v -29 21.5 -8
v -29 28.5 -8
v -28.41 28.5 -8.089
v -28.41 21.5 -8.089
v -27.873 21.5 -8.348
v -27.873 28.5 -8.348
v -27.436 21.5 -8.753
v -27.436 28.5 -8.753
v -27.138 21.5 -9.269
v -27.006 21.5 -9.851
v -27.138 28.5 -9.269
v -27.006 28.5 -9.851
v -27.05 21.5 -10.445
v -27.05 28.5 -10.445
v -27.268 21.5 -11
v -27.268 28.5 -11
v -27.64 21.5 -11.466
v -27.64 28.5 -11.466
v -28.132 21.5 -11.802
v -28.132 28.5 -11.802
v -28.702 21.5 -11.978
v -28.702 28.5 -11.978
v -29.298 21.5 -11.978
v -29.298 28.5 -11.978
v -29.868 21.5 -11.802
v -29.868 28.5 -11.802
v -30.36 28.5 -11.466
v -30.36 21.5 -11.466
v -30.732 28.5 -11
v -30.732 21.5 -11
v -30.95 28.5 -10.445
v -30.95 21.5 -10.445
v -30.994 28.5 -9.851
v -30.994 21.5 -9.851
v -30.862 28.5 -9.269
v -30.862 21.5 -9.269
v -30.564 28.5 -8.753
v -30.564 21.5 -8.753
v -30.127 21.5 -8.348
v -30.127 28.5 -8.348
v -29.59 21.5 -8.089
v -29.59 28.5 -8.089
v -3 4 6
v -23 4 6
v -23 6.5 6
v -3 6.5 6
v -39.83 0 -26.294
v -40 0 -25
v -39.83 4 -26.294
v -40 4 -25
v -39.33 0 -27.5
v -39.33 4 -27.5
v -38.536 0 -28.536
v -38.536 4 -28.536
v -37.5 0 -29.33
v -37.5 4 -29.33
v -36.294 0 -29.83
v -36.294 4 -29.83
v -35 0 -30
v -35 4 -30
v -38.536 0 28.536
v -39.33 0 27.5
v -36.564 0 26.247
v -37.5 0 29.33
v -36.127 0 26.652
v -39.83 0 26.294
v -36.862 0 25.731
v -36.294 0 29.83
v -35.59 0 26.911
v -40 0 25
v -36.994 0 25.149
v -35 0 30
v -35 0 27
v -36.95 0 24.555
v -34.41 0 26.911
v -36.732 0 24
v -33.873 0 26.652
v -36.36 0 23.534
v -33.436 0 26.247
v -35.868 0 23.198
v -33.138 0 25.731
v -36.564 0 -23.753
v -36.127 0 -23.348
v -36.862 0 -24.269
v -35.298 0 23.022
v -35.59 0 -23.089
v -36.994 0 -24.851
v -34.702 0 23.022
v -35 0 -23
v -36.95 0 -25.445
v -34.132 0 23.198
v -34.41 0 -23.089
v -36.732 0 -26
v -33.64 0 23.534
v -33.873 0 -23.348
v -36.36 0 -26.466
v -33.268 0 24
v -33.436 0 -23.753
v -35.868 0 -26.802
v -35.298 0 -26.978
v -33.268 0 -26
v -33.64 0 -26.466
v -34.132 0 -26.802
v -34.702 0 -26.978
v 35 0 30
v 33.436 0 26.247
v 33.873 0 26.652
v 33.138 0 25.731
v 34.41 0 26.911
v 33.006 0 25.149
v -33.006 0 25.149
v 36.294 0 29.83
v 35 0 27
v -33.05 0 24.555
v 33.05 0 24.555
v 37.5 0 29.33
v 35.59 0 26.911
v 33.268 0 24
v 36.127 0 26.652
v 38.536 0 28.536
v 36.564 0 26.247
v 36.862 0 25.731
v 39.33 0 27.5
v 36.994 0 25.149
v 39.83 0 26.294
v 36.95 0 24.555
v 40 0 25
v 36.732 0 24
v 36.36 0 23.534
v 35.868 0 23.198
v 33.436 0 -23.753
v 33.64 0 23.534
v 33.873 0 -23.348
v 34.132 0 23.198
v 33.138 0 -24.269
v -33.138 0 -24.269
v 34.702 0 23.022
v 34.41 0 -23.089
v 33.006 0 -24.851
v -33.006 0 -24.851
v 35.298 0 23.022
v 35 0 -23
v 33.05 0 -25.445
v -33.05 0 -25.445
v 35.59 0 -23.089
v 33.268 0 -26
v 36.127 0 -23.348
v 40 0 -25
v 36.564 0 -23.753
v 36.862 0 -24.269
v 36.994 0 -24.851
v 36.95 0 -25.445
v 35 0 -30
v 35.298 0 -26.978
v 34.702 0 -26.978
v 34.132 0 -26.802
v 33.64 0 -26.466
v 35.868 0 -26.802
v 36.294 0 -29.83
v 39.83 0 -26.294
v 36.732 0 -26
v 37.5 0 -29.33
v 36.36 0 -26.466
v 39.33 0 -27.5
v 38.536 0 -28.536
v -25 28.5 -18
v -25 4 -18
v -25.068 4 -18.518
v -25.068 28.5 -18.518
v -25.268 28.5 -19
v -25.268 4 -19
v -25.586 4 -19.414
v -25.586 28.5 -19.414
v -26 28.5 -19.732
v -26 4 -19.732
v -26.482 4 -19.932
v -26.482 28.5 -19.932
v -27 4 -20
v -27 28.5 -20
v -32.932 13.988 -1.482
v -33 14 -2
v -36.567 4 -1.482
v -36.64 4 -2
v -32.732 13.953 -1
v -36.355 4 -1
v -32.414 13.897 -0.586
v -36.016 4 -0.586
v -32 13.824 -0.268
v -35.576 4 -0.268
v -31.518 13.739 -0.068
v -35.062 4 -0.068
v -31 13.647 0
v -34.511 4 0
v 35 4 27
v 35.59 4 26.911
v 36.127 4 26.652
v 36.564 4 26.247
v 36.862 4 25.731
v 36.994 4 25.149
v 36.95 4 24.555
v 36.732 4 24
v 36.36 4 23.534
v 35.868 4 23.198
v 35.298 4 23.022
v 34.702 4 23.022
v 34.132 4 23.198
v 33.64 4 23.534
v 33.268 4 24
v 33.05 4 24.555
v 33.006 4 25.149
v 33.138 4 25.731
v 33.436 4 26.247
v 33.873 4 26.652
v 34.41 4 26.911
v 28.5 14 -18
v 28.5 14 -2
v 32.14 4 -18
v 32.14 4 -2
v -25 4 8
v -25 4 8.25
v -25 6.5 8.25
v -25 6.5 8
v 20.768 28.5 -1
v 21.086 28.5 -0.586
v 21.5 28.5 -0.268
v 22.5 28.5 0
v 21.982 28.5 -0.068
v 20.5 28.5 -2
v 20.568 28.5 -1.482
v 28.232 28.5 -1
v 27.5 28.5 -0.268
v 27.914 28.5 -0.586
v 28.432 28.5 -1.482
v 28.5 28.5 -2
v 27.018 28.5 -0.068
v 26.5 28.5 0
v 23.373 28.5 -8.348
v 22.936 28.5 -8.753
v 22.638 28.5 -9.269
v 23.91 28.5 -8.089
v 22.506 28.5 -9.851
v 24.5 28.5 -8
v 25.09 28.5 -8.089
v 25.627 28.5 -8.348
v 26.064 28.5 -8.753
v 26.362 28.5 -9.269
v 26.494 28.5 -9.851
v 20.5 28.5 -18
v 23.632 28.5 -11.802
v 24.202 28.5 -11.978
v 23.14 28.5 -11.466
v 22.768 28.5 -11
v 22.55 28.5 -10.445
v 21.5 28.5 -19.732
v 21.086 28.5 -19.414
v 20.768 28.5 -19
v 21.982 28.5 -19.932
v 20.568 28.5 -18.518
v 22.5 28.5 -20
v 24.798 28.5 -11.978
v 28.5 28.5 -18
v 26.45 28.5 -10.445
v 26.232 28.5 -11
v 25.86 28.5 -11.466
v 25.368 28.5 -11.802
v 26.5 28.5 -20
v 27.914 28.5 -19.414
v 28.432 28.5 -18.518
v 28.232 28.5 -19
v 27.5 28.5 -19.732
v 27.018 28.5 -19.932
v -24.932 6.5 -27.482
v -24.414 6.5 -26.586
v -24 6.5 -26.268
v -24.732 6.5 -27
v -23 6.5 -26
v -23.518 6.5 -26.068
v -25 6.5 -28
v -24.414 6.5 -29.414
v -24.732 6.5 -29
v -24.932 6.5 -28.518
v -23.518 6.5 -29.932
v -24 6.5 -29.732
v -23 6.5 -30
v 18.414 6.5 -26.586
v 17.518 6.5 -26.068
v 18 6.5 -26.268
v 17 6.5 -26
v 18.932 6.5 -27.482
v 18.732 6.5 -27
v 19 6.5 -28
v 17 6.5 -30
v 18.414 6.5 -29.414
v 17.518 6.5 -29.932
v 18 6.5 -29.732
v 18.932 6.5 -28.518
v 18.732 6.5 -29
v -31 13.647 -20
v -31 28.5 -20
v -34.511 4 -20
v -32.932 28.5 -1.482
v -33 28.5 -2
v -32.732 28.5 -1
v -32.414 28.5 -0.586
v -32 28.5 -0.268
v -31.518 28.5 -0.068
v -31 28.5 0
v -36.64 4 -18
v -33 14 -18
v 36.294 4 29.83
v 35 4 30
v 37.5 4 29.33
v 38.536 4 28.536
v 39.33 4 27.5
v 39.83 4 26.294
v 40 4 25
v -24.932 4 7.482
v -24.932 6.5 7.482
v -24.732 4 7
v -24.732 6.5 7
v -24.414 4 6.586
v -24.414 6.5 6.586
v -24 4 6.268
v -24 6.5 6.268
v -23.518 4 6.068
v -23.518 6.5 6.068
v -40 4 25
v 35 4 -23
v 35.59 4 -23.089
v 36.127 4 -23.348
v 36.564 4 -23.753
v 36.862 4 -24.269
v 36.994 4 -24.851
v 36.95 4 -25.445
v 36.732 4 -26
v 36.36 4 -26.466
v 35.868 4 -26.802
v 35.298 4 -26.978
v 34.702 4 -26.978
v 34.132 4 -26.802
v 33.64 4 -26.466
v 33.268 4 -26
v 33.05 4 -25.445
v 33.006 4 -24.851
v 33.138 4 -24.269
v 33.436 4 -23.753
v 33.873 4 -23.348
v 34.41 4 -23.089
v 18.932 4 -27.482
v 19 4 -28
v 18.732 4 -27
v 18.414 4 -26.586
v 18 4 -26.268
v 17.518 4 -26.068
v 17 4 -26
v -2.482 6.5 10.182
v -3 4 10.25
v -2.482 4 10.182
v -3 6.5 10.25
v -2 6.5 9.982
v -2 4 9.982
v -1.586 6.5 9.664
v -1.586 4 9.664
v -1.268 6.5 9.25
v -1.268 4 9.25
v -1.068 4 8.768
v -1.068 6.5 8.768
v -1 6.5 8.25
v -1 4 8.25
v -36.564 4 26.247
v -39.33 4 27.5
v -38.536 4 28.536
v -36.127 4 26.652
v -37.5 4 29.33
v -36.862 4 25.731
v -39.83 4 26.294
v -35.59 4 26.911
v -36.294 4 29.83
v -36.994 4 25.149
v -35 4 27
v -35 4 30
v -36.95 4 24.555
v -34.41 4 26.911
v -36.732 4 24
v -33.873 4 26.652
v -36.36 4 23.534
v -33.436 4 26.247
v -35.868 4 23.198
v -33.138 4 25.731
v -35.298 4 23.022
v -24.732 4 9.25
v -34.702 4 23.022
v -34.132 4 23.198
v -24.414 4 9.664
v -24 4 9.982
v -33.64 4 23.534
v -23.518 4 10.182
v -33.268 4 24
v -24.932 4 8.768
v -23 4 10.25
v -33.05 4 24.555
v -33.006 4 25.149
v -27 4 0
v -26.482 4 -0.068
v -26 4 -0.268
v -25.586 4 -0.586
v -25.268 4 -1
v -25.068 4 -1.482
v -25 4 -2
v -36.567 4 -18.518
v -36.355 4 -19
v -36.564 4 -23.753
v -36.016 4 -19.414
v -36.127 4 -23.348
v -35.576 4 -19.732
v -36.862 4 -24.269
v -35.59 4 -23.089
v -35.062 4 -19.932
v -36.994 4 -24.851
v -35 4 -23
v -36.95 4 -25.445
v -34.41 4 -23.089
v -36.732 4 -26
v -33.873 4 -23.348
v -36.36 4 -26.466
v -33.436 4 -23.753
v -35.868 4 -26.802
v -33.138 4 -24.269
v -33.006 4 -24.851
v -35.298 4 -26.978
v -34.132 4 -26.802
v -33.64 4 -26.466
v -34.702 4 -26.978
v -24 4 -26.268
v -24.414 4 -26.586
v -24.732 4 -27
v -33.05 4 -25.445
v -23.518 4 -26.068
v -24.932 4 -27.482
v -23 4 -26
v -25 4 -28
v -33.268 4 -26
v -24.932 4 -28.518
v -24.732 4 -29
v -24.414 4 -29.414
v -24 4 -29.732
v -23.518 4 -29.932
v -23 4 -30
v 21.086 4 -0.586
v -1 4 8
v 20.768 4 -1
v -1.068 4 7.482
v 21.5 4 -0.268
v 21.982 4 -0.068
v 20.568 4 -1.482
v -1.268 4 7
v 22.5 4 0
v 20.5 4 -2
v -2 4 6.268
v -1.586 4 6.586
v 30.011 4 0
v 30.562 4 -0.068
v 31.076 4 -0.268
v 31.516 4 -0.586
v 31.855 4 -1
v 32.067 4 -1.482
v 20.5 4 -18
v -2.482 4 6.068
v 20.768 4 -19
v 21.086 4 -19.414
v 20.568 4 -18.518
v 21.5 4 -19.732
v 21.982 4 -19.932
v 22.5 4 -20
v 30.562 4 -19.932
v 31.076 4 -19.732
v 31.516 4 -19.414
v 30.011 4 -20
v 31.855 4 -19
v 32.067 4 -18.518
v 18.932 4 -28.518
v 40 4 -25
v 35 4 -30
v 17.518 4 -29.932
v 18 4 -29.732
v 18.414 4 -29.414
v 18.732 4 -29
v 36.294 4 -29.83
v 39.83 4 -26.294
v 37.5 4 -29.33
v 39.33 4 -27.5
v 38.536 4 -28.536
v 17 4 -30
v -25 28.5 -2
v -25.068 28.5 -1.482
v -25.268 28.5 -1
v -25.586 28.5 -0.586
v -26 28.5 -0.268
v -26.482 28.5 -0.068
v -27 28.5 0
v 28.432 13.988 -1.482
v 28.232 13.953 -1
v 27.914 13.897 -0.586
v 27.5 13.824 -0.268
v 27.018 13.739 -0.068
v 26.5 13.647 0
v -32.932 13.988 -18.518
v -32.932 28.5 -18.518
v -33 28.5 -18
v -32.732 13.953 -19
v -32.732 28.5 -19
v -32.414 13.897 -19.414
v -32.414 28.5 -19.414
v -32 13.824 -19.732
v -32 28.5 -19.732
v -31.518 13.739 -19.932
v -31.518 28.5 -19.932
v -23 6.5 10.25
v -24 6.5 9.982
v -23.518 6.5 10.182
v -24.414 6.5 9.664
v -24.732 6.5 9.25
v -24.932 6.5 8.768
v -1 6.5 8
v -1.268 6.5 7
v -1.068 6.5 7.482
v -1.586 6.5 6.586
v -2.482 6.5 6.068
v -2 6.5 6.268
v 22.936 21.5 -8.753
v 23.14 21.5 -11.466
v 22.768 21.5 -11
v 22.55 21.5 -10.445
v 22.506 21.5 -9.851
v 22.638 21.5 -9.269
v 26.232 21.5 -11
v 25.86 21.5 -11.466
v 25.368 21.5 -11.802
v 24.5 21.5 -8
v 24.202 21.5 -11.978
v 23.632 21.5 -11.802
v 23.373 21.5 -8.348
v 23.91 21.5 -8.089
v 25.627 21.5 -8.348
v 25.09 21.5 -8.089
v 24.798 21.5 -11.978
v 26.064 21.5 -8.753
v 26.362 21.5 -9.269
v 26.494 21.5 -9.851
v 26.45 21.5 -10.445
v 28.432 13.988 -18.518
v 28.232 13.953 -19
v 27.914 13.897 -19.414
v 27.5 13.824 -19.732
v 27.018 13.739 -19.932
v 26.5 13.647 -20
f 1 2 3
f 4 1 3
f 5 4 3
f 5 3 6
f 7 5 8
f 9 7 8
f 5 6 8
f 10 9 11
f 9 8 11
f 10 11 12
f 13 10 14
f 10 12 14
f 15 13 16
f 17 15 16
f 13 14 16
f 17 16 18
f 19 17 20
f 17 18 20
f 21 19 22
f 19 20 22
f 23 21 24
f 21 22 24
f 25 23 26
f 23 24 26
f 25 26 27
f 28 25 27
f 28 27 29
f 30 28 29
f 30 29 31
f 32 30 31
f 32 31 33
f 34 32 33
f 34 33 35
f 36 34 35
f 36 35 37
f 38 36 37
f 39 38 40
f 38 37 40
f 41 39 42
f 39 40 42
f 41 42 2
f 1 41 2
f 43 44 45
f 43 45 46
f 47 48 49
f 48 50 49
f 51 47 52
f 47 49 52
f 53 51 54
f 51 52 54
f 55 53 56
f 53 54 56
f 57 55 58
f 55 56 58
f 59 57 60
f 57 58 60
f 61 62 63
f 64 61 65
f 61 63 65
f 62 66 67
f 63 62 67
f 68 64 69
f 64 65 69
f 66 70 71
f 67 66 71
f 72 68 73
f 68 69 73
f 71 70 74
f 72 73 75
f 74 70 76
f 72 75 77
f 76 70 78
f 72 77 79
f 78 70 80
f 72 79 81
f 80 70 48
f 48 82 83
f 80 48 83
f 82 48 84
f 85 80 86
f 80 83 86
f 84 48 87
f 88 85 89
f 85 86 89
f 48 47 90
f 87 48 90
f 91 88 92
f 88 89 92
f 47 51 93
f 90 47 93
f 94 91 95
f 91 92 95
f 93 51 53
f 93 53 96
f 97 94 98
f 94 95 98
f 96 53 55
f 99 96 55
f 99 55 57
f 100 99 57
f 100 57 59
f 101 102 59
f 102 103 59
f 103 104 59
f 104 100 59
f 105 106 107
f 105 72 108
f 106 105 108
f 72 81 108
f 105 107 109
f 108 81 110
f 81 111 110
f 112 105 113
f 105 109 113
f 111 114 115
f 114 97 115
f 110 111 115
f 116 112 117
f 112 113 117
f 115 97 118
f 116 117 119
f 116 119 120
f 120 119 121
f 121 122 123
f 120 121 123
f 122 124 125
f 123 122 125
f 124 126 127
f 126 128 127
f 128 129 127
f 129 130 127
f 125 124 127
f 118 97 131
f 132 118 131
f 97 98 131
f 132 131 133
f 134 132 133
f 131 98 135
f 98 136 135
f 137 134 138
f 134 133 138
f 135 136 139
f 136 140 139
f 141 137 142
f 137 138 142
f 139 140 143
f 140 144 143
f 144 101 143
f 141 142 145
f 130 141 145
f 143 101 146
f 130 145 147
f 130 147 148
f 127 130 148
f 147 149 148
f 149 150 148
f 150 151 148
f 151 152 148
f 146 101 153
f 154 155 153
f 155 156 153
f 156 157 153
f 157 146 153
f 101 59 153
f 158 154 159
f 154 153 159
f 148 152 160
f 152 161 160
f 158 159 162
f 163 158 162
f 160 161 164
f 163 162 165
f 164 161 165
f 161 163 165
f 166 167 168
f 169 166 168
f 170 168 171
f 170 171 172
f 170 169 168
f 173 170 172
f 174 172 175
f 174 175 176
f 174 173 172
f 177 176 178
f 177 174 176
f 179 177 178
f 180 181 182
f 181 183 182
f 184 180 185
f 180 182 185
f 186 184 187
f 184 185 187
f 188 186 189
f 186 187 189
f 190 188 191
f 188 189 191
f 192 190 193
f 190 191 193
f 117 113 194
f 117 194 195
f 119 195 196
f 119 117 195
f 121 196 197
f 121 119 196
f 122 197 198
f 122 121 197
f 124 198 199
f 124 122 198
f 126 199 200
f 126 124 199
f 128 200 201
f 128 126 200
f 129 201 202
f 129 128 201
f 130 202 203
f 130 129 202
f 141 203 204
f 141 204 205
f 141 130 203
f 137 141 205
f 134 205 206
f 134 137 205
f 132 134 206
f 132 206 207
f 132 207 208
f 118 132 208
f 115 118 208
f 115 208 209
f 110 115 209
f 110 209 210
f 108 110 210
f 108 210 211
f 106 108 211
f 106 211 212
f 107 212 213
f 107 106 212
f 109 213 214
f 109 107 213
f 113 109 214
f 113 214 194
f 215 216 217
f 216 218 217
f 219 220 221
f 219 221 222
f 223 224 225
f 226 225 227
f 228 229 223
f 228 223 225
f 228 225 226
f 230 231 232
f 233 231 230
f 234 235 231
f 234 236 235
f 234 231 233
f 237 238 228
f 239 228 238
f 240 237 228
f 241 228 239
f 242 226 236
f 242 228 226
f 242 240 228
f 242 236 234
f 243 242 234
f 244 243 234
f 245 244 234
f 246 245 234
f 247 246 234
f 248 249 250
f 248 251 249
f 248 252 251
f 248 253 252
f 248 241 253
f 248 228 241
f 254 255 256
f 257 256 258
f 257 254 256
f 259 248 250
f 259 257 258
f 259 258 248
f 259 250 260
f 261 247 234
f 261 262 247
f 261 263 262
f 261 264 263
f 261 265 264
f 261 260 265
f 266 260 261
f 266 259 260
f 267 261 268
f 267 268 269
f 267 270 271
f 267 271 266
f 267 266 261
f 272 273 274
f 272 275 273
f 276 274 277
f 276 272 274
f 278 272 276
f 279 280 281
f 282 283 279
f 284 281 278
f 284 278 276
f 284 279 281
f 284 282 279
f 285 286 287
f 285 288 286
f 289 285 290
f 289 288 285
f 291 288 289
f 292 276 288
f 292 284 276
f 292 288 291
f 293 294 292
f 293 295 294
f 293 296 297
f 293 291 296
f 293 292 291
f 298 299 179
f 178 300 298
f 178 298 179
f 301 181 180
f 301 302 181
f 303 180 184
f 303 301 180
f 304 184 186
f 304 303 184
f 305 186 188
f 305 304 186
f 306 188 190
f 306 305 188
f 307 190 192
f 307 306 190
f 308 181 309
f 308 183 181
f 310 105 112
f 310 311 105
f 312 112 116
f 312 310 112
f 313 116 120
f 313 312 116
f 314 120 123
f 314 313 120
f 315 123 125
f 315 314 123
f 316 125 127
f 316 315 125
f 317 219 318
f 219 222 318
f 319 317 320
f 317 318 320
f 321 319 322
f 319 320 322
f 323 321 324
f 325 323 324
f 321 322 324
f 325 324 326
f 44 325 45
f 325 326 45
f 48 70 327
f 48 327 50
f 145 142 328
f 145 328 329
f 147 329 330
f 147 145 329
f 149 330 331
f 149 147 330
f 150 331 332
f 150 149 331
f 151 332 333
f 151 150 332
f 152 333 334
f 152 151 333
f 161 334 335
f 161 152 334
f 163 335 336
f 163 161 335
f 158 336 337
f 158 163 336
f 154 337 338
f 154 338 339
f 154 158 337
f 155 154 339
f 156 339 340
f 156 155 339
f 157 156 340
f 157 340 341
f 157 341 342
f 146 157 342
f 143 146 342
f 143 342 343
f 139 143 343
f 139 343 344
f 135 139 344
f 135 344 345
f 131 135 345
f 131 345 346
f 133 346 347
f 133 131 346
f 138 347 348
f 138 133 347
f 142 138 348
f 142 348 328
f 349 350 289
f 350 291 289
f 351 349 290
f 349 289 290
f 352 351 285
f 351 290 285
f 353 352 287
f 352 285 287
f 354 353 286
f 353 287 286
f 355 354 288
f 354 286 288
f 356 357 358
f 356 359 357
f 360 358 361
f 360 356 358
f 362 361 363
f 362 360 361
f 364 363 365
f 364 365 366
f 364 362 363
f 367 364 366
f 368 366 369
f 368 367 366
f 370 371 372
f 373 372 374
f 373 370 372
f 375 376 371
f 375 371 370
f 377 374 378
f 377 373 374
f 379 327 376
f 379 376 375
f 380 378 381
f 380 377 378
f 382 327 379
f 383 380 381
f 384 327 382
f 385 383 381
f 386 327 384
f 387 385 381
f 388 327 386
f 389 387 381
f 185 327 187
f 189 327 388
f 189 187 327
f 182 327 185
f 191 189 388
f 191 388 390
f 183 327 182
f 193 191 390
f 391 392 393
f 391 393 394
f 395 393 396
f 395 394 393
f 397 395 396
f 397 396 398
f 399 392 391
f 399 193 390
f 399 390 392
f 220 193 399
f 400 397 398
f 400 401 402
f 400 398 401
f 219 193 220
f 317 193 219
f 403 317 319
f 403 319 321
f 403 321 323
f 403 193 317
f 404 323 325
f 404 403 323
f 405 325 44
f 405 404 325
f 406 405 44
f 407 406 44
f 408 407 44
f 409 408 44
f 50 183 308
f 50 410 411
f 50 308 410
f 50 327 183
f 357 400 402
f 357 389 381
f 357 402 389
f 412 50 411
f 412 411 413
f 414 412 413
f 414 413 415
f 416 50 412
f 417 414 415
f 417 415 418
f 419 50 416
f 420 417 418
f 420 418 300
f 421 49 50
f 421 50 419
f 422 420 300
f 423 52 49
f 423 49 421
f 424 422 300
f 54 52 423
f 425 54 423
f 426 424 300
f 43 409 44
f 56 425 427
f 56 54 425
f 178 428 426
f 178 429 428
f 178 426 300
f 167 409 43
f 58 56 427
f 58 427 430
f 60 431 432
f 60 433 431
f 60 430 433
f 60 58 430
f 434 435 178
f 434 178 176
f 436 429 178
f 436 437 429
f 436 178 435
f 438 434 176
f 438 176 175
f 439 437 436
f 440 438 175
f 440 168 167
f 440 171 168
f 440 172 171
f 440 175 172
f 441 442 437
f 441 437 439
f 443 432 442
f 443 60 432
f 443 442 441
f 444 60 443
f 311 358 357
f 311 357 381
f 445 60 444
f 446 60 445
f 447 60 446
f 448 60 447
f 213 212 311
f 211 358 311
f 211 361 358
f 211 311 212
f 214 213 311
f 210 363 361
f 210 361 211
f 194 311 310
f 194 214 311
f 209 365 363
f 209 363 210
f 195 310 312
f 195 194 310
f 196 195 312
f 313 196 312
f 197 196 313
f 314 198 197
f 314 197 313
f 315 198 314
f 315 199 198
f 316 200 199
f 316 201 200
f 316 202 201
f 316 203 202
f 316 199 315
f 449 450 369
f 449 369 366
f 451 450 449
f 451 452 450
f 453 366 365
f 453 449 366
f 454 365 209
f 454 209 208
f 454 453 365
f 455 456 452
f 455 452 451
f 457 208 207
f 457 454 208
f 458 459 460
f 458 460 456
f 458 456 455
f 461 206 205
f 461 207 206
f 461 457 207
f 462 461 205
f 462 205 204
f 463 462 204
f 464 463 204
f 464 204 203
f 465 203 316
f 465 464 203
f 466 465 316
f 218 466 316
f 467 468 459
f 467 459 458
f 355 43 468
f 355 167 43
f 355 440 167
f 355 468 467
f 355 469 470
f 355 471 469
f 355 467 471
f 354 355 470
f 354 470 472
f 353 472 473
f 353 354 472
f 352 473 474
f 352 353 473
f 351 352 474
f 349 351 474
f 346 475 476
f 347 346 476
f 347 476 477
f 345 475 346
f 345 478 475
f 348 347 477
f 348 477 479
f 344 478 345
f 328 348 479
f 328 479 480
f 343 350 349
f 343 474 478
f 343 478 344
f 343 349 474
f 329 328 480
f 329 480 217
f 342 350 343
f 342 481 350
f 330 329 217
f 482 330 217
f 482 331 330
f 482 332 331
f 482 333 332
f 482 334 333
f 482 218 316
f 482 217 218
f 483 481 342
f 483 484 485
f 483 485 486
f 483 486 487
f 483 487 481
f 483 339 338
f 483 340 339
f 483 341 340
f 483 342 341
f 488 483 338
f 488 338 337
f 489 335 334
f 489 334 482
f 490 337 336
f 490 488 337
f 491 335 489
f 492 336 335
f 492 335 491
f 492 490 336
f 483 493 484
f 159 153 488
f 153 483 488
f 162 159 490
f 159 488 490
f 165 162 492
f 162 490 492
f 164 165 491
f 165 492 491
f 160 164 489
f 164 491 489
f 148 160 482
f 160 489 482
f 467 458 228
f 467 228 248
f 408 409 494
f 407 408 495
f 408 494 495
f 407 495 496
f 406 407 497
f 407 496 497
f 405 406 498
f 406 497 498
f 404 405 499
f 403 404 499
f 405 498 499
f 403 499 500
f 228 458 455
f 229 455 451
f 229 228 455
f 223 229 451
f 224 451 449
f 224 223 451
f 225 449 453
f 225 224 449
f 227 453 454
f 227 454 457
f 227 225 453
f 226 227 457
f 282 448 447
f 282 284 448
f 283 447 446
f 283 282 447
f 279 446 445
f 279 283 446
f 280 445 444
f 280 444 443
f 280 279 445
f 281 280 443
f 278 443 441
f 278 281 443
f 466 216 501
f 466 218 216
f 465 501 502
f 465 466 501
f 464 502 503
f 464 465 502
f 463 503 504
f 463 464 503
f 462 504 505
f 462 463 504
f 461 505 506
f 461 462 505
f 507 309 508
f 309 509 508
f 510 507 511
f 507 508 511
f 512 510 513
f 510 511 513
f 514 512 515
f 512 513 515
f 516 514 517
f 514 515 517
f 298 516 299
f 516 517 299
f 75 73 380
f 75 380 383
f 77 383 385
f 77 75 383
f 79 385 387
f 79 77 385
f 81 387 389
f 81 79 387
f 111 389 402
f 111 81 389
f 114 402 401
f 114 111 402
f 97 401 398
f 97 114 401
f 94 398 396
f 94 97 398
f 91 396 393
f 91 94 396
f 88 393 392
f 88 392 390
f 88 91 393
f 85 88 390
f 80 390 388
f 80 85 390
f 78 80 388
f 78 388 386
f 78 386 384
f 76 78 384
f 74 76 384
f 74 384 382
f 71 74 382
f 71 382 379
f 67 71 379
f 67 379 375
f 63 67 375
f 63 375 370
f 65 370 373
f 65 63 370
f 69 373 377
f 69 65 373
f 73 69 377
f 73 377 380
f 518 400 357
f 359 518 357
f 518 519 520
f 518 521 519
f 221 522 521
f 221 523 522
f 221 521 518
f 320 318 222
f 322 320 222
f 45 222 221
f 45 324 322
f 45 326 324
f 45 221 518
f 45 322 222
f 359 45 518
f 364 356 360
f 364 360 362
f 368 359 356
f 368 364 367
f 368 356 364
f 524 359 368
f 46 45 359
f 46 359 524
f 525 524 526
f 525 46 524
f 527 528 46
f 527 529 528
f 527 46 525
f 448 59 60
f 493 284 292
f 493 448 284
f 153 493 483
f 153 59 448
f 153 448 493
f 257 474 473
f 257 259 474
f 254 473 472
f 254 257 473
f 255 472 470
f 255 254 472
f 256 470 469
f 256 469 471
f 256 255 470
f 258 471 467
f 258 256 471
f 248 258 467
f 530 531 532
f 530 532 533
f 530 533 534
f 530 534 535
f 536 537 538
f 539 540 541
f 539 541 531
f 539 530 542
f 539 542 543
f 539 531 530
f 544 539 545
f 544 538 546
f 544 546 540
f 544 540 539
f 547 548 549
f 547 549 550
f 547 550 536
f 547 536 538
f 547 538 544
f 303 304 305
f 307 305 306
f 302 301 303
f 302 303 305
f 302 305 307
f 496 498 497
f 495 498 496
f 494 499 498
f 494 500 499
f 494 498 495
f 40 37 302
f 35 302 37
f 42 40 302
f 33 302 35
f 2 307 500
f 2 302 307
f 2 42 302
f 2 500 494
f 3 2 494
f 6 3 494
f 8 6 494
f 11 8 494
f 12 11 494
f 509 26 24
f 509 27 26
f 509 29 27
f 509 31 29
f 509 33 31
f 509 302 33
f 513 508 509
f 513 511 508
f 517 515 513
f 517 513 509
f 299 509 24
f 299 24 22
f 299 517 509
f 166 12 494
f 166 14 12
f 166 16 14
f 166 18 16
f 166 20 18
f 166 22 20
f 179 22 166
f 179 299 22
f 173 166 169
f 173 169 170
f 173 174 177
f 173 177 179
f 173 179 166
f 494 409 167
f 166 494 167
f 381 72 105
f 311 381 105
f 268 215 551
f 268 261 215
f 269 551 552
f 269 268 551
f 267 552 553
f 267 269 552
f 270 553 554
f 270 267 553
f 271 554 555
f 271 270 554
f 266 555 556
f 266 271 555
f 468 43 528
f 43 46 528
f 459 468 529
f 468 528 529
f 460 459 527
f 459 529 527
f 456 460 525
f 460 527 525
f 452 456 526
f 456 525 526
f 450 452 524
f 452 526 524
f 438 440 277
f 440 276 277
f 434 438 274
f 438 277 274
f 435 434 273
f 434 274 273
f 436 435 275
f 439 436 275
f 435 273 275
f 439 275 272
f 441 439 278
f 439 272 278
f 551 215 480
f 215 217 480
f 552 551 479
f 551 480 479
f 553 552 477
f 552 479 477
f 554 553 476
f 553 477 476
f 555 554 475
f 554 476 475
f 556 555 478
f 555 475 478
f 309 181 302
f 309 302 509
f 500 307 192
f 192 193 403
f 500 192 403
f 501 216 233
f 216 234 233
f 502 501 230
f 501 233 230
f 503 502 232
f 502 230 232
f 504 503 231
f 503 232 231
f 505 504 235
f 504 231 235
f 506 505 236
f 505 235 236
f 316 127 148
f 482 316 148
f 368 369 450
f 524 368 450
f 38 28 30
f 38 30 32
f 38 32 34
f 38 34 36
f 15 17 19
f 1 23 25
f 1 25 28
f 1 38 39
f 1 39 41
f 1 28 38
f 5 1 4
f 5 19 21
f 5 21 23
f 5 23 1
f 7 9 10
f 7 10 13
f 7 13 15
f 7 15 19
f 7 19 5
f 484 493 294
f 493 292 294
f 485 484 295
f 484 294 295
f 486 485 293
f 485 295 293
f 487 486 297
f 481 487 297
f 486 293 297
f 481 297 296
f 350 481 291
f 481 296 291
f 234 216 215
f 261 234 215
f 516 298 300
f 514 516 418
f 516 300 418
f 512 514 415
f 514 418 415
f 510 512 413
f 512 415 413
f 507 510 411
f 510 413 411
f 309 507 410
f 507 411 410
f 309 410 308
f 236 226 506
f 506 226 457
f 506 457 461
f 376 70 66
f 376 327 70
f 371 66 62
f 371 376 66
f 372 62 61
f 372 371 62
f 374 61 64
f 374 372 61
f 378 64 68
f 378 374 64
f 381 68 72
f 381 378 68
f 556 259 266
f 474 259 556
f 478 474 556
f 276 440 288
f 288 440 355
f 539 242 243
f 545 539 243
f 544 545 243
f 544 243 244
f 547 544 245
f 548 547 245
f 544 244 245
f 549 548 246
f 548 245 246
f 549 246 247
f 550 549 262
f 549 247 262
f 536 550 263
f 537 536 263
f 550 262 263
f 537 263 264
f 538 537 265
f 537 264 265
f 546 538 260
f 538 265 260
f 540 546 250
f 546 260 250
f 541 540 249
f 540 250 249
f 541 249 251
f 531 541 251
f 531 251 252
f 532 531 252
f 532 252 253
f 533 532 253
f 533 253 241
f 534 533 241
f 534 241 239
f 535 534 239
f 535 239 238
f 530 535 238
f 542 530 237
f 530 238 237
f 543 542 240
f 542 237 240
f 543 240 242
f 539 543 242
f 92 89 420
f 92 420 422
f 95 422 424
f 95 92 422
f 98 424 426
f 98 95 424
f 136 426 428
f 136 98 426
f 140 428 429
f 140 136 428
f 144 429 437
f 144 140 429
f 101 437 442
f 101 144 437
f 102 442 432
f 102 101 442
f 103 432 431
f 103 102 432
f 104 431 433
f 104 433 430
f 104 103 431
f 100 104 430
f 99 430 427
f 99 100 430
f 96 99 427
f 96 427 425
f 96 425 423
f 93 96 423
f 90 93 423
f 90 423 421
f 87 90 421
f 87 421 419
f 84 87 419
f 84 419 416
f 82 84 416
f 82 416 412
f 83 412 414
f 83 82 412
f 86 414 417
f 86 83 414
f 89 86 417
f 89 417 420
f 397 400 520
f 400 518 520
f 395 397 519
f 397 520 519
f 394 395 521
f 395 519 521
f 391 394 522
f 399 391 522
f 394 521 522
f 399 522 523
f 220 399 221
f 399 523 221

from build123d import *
from OCP.BRepFilletAPI import BRepFilletAPI_MakeChamfer

# Parameters (mm, degrees)
SKETCH_1_W          = 80
SKETCH_1_H          = 60
SKETCH_1_R          = 2
EXTRUDE_1_DEPTH     = 4
FILLET_1_R          = 5
SKETCH_2_W          = 44
SKETCH_2_H          = 4
SKETCH_2_W_2        = 24
SKETCH_2_H_2        = 4.25
EXTRUDE_2_DEPTH     = 2.5
SKETCH_2_3_W        = 8
SKETCH_2_3_H        = 20
EXTRUDE_3_DEPTH     = 24.5
SKETCH_3_R          = 2
CUT_EXTRUDE_1_DEPTH = 7
CHAMFER_1_SIZE      = 10
CHAMFER_1_SIZE2     = 3.639702343
FILLET_2_R          = 2
FILLET_3_R          = 2


with BuildPart() as part:
    # Эскиз1 → Бобышка-Вытянуть1 (new body)
    with BuildSketch(Plane(origin=(0, 0, 0), x_dir=(1, 0, 0), z_dir=(0, 1, 0))):
        Rectangle(SKETCH_1_W, SKETCH_1_H)
        with Locations(Location((-35, 25, 0), (0, 0, 270))):
            Circle(SKETCH_1_R, mode=Mode.SUBTRACT)
        with Locations(Location((35, 25, 0), (0, 0, 270))):
            Circle(SKETCH_1_R, mode=Mode.SUBTRACT)
        with Locations(Location((-35, -25, 0), (0, 0, 270))):
            Circle(SKETCH_1_R, mode=Mode.SUBTRACT)
        with Locations(Location((35, -25, 0), (0, 0, 270))):
            Circle(SKETCH_1_R, mode=Mode.SUBTRACT)
    extrude(amount=EXTRUDE_1_DEPTH)

    # Скругление1
    fillet_1_edges = [part.edges().sort_by_distance(p)[0] for p in [
        (40, 2, 30),
        (-40, 2, 30),
        (-40, 2, -30),
        (40, 2, -30),
    ]]
    fillet(fillet_1_edges, radius=FILLET_1_R)

    # Эскиз2 → Бобышка-Вытянуть2 (add)
    with BuildSketch(Plane(origin=(0, 4, 0), x_dir=(1, 0, 0), z_dir=(0, 1, 0))):
        with Locations((-3, 28)):
            Rectangle(SKETCH_2_W, SKETCH_2_H)
        with Locations((-13, -8.125)):
            Rectangle(SKETCH_2_W_2, SKETCH_2_H_2)
    extrude(amount=EXTRUDE_2_DEPTH)

    # Эскиз2<3> → Бобышка-Вытянуть3 (add)
    with BuildSketch(Plane(origin=(0, 4, 0), x_dir=(1, 0, 0), z_dir=(0, 1, 0))):
        with Locations((24.5, 10)):
            Rectangle(SKETCH_2_3_W, SKETCH_2_3_H)
        with Locations((-29, 10)):
            Rectangle(SKETCH_2_3_W, SKETCH_2_3_H)
    extrude(amount=EXTRUDE_3_DEPTH)

    # Эскиз3 → Вырез-Вытянуть1 (cut)
    with BuildSketch(Plane(origin=(0, 28.5, 0), x_dir=(1, 0, 0), z_dir=(0, 1, 0))):
        with Locations(Location((-29, 10, 0), (0, 0, 270))):
            Circle(SKETCH_3_R)
        with Locations(Location((24.5, 10, 0), (0, 0, 270))):
            Circle(SKETCH_3_R)
    extrude(amount=-CUT_EXTRUDE_1_DEPTH, mode=Mode.SUBTRACT)

    # Фаска1: one chamfer whose edges measure the first distance from different faces: ONE call of the kernel's chamfer builder (chamfer() names one face for all edges)
    chamfer_1_edges_1 = [part.edges().sort_by_distance(p)[0] for p in [
        (28.5, 4, -10),
    ]]
    chamfer_1_side_1 = [part.faces().sort_by_distance(p)[0] for p in [
        (28.5, 16.25, -10),
    ]]
    chamfer_1_edges_2 = [part.edges().sort_by_distance(p)[0] for p in [
        (-33, 4, -10),
    ]]
    chamfer_1_side_2 = [part.faces().sort_by_distance(p)[0] for p in [
        (-33, 16.25, -10),
    ]]
    chamfer_1 = BRepFilletAPI_MakeChamfer(part.part.solid().wrapped)
    for e in chamfer_1_edges_1:
        chamfer_1.Add(CHAMFER_1_SIZE, CHAMFER_1_SIZE2, e.wrapped, chamfer_1_side_1[0].wrapped)  # the first distance lies on this face
    for e in chamfer_1_edges_2:
        chamfer_1.Add(CHAMFER_1_SIZE, CHAMFER_1_SIZE2, e.wrapped, chamfer_1_side_2[0].wrapped)  # the first distance lies on this face
    add(Compound.cast(chamfer_1.Shape()), mode=Mode.REPLACE)

    # Скругление2
    fillet_2_edges = [part.edges().sort_by_distance(p)[0] for p in [
        (-34.819851171, 9, 0),
        (-34.819851171, 9, -20),
        (30.319851171, 9, 0),
        (30.319851171, 9, -20),
        (28.5, 21.25, -20),
        (20.5, 16.25, -20),
        (20.5, 16.25, 0),
        (28.5, 21.25, 0),
        (-25, 16.25, 0),
        (-25, 16.25, -20),
        (-33, 21.25, -20),
        (-33, 21.25, 0),
    ]]
    fillet(fillet_2_edges, radius=FILLET_2_R)

    # Скругление3
    fillet_3_edges = [part.edges().sort_by_distance(p)[0] for p in [
        (-25, 5.25, -26),
        (19, 5.25, -30),
        (-25, 5.25, -30),
        (19, 5.25, -26),
        (-1, 5.25, 6),
        (-25, 5.25, 6),
        (-25, 5.25, 10.25),
        (-1, 5.25, 10.25),
    ]]
    fillet(fillet_3_edges, radius=FILLET_3_R - 0.0001)  # a hair under: the kernel refuses the full size


solid = part.part
